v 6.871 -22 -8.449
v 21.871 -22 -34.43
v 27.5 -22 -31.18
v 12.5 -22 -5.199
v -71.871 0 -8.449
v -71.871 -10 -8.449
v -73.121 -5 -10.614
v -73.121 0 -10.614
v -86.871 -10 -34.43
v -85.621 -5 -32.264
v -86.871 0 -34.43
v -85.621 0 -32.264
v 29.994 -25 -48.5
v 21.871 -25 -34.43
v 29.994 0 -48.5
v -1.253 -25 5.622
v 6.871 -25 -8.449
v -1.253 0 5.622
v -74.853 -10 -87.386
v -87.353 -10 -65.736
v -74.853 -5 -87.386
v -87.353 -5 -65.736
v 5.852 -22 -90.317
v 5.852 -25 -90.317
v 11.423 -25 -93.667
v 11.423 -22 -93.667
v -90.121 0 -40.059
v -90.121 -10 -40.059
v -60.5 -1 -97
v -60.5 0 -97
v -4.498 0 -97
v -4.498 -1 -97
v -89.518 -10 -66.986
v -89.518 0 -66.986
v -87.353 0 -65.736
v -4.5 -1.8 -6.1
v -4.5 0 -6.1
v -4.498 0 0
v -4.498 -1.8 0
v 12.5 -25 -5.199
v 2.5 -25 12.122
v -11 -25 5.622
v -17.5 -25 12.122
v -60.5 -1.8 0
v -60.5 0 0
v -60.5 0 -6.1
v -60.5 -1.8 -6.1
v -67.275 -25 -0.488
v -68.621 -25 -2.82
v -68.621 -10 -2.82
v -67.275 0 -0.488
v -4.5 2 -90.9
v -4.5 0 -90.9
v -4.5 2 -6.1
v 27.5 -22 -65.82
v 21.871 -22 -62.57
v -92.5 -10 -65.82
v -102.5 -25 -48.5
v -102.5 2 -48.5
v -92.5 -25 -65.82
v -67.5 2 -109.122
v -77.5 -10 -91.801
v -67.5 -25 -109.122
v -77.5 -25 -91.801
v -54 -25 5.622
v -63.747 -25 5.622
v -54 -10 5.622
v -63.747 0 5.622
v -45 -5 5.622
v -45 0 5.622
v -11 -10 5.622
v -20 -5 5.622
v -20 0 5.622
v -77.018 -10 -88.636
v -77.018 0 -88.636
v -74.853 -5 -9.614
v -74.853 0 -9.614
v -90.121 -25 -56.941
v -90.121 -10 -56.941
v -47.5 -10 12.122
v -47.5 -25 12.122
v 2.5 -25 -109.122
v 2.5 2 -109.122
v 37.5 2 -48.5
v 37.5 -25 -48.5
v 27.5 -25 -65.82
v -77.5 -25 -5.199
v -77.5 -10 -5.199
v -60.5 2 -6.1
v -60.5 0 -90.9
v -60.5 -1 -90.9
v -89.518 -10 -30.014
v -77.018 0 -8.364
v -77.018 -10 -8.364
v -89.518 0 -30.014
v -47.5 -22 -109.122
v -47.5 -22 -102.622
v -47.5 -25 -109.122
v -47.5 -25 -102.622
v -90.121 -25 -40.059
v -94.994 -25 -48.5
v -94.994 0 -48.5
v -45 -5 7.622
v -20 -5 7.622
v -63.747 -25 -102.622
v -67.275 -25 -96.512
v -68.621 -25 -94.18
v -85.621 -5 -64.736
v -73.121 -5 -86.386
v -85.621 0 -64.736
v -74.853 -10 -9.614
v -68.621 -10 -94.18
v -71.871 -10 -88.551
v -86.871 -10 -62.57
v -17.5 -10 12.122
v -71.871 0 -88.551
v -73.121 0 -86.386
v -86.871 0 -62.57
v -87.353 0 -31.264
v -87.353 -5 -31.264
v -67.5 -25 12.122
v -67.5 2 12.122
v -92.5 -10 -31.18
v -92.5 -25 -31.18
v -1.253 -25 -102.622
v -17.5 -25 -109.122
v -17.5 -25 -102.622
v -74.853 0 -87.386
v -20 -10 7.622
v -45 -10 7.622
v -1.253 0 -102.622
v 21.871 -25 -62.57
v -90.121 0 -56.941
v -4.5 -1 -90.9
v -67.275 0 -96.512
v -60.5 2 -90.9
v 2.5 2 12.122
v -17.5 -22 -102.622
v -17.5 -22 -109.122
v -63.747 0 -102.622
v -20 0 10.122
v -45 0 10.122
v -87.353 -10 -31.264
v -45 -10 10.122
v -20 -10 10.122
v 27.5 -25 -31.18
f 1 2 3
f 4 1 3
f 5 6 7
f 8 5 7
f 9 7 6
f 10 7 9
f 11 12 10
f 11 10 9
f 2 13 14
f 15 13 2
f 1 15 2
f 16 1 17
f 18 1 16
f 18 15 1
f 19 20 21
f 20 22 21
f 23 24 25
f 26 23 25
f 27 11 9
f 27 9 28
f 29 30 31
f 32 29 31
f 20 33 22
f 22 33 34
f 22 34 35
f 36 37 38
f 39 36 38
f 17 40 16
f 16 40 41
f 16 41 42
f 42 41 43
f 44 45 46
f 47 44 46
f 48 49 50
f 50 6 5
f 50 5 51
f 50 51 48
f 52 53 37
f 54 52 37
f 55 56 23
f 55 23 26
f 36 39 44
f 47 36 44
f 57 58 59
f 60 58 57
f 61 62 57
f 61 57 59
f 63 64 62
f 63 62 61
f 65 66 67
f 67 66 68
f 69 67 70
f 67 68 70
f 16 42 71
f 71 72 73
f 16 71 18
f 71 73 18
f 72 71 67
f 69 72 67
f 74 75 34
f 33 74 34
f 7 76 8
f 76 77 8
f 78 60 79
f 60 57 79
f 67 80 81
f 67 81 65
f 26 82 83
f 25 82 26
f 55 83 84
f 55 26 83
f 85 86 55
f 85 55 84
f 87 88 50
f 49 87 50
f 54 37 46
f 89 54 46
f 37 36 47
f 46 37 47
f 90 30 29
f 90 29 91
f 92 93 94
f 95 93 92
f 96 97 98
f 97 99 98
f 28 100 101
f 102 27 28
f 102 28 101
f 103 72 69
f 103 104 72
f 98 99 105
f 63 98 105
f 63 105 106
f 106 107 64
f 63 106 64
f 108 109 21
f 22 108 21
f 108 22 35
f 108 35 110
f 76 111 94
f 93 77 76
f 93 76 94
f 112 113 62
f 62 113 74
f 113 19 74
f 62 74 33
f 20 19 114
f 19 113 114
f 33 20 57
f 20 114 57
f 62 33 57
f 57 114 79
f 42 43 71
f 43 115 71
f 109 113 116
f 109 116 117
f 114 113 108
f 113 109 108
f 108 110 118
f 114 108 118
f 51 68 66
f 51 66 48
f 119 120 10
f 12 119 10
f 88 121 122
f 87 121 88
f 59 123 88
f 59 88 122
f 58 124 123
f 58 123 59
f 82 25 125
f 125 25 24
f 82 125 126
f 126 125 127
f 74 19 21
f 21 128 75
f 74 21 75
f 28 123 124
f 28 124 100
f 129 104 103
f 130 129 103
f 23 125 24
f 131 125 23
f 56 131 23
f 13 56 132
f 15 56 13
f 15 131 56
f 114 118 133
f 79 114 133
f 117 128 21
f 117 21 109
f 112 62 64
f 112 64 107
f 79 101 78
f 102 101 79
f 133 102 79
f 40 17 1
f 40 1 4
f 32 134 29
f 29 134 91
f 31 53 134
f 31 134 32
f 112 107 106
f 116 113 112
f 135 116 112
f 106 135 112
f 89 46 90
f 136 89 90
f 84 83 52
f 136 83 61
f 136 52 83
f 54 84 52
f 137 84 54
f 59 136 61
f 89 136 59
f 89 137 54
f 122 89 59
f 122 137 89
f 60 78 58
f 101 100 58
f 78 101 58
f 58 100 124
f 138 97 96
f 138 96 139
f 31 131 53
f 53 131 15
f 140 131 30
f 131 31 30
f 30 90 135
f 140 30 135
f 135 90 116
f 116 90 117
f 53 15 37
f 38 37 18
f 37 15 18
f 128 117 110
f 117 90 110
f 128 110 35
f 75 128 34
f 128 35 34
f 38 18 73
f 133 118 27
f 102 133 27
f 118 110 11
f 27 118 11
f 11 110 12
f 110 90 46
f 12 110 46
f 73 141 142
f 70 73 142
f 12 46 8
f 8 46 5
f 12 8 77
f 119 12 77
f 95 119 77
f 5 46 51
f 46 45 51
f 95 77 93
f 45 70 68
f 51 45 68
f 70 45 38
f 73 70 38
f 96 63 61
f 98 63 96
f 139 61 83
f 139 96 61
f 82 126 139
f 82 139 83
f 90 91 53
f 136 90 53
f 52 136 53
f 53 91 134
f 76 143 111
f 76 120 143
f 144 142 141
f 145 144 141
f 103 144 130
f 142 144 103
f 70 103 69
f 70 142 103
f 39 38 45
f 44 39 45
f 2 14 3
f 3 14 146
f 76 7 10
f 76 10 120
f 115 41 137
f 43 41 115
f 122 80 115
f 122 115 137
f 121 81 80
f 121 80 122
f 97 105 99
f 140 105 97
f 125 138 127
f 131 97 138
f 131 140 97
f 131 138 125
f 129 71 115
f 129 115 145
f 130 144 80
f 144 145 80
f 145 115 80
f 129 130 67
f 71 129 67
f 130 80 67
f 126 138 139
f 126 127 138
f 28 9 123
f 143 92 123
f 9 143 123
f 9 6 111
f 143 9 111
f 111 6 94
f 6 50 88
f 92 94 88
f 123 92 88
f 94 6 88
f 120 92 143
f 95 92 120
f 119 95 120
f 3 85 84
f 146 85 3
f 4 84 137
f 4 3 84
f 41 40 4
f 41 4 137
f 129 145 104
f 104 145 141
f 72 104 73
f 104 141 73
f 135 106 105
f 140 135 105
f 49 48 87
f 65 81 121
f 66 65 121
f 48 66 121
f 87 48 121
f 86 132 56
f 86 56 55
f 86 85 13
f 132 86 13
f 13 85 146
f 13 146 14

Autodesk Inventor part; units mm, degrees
ref_plane "YZ Plane" through (0, 0, 0) normal (1, 0, 0) x (0, 1, 0)
ref_plane "XZ Plane" through (0, 0, 0) normal (0, 1, 0) x (-1, 0, 0)
ref_plane "XY Plane" through (0, 0, 0) normal (0, 0, 1) x (1, 0, 0)
sketch "Sketch6" plane through (0, 0, 0) normal (0, 1, 0) x (-1, 0, 0)
  line L0 (4.5, -6.1) -> (60.5, -6.1)
  line L1 (60.5, -6.1) -> (60.5, -90.9)
  line L2 (4.5, -90.9) -> (4.5, -6.1)
  line L3 (65.1201, -97) -> (0, -97)
  line L4 (0, -97) -> (0, 0)
  line L5 (0, 0) -> (65.1201, 0)
  line L6 (65.1201, 0) -> (65.1201, -97)
  line L7 (60.5, -90.9) -> (4.5, -90.9)
  line L8 (102.5, -48.5) -> (-37.5, -48.5)
  line L9 (32.5, -118.5) -> (32.5, 21.5)
  circle A0 centre (32.5, -48.5) radius 70
  line L10 (102.5, -48.5) -> (67.5, -109.1218)
  line L11 (67.5, -109.1218) -> (-2.5, -109.1218)
  line L12 (-2.5, -109.1218) -> (-37.5, -48.5)
  line L13 (-37.5, -48.5) -> (-2.5, 12.1218)
  line L14 (-2.5, 12.1218) -> (67.5, 12.1218)
  line L15 (67.5, 12.1218) -> (102.5, -48.5)
  line L16 (32.5, 12.1218) -> (85, -18.1891)
  line L17 (85, -18.1891) -> (85, -78.8109)
  line L18 (85, -78.8109) -> (32.5, -109.1218)
  line L19 (32.5, -109.1218) -> (-20, -78.8109)
  line L20 (-20, -78.8109) -> (-20, -18.1891)
  line L21 (-20, -18.1891) -> (32.5, 12.1218)
  line L22 (32.5, 12.1218) -> (47.5, 12.1218)
  line L23 (47.5, 12.1218) -> (47.5, 5.6218)
  line L24 (47.5, 5.6218) -> (17.5, 5.6218)
  line L25 (17.5, 5.6218) -> (17.5, 12.1218)
  line L26 (47.5, 5.6218) -> (56.6924, 5.6218) construction
  line L27 (17.5, 8.8718) -> (20, 8.8718)
  line L28 (47.5, 8.8718) -> (45, 8.8718)
  line L29 (45, 8.8718) -> (45, 10.1218)
  line L30 (45, 10.1218) -> (20, 10.1218)
  line L31 (20, 10.1218) -> (20, 7.6218)
  line L32 (20, 7.6218) -> (45, 7.6218)
  line L33 (45, 7.6218) -> (45, 10.1218)
  line L34 (67.5, 12.1218) -> (32.5, -48.5)
  line L35 (32.5, -48.5) -> (67.5, -109.1218)
  line L36 (47.5, 5.6218) -> (56.6924, 5.6218)
  line L37 (17.5, 5.6218) -> (11, 5.6218)
  line L38 (17.5, 12.1218) -> (11, 5.6218)
  line L39 (17.5, 12.1218) -> (26.6924, 12.1218) construction
  line L40 (47.5, 12.1218) -> (54, 5.6218)
  line L41 (85, -18.1891) -> (77.5, -5.1987)
  line L42 (77.5, -5.1987) -> (71.8708, -8.4487)
  line L43 (71.8708, -8.4487) -> (86.8708, -34.4295)
  line L44 (86.8708, -34.4295) -> (92.5, -31.1795)
  line L45 (71.8708, -8.4487) -> (67.2746, -0.4879) construction
  line L46 (89.6854, -32.8045) -> (88.4354, -30.6394)
  line L47 (74.6854, -6.8237) -> (75.9354, -8.9888)
  line L48 (75.9354, -8.9888) -> (77.0179, -8.3638)
  line L49 (77.0179, -8.3638) -> (89.5179, -30.0144)
  line L50 (89.5179, -30.0144) -> (87.3529, -31.2644)
  line L51 (87.3529, -31.2644) -> (74.8529, -9.6138)
  line L52 (74.8529, -9.6138) -> (77.0179, -8.3638)
  line L53 (71.8708, -8.4487) -> (67.2746, -0.4879)
  line L54 (86.8708, -34.4295) -> (90.1208, -40.0587)
  line L55 (92.5, -31.1795) -> (90.1208, -40.0587)
  line L56 (92.5, -31.1795) -> (87.9038, -23.2187) construction
  line L57 (77.5, -5.1987) -> (68.6208, -2.8196)
  line L58 (71.8708, -88.5513) -> (67.2746, -96.5121) construction
  line L59 (74.6854, -90.1763) -> (75.9354, -88.0112)
  line L60 (74.8529, -87.3862) -> (77.0179, -88.6362)
  line L61 (77.5, -91.8013) -> (71.8708, -88.5513)
  line L62 (77.5, -91.8013) -> (68.6208, -94.1804)
  line L63 (71.8708, -88.5513) -> (67.2746, -96.5121)
  line L64 (77.0179, -88.6362) -> (89.5179, -66.9856)
  line L65 (87.3529, -65.7356) -> (74.8529, -87.3862)
  line L66 (71.8708, -88.5513) -> (86.8708, -62.5705)
  line L67 (89.5179, -66.9856) -> (87.3529, -65.7356)
  line L68 (89.6854, -64.1955) -> (88.4354, -66.3606)
  line L69 (86.8708, -62.5705) -> (92.5, -65.8205)
  line L70 (86.8708, -62.5705) -> (90.1208, -56.9413)
  line L71 (92.5, -65.8205) -> (90.1208, -56.9413)
  line L72 (94.9944, -48.5) -> (63.7472, -102.6218)
  line L73 (63.7472, -102.6218) -> (1.2528, -102.6218)
  line L74 (1.2528, -102.6218) -> (-29.9944, -48.5)
  line L75 (-29.9944, -48.5) -> (1.2528, 5.6218)
  line L76 (1.2528, 5.6218) -> (63.7472, 5.6218)
  line L77 (63.7472, 5.6218) -> (94.9944, -48.5)
  line L78 (74.8529, -87.3862) -> (73.1208, -86.3862)
  line L79 (87.3529, -65.7356) -> (85.6208, -64.7356)
  line L80 (87.3529, -31.2644) -> (85.6208, -32.2644)
  line L81 (74.8529, -9.6138) -> (73.1208, -10.6138)
  line L82 (45, 7.6218) -> (45, 5.6218)
  line L83 (20, 7.6218) -> (20, 5.6218)
  line L84 (60.5, -90.9) -> (4.4985, -90.9)
  line L85 (4.4985, -90.9) -> (4.4985, -97)
  line L86 (4.4985, -97) -> (60.5, -97)
  line L87 (60.5, -97) -> (60.5, -90.9)
  line L88 (60.5, -6.1) -> (4.4985, -6.1)
  line L89 (4.4985, -6.1) -> (4.4985, 0)
  line L90 (4.4985, 0) -> (60.5, 0)
  line L91 (60.5, 0) -> (60.5, -6.1)
  dimension "d44" = 97
  dimension "d77" = 140
  dimension "d87" = 15
  dimension "d88" = 6.5
  dimension "d89" = 30
  dimension "d91" = 2.5
  dimension "d92" = 2.5
  dimension "d95" = 1.25
  dimension "d96" = 25
  dimension "d97" = 2.5
  dimension "d98" = 25
  dimension "d99" = 135
  dimension "d100" = 0
extrude "Fronte" add sketch "Sketch6" along normal blind 2 contours L89 L21 L5 L9 L0 | L2 L8 L4 L21 L89 | L9 L5 L16 L34 L0 | L2 L85 L19 L4 L8 | L89 L5 L21 | L21 L4 L5 L89 | L34 L16 L91 L0 | L9 L24 L16 L5 | L5 L21 L24 L9 | L7 L9 L3 L19 L85 | L8 L20 L75 L21 L4 | L4 L19 L74 L20 L8 | L21 L75 L76 L37 L24 L5 L4 | L91 L16 L6 L8 L1 | L34 L91 L16 | L16 L5 L34 | L8 L6 L18 L87 L1 | L7 L35 L18 L3 L9 | L7 L87 L18 L35 | L16 L24 L36 L76 L34 L5 | L24 L21 L32 L9 | L9 L32 L16 L24 | L85 L3 L4 L19 | L19 L3 L85 | L4 L3 L19 L73 L74 | L20 L74 L8 | L8 L75 L20 | L75 L20 L21 | L21 L13 L14 L38 L76 L75 | L24 L83 L32 L21 | L91 L5 L6 L16 | L34 L77 L53 L43 L16 L6 L5 | L8 L17 L66 L18 L6 | L6 L16 L43 L17 L8 | L9 L73 L19 L3 | L3 L18 L73 L9 | L35 L3 L18 | L18 L87 L35 | L16 L32 L82 L24 | L32 L21 L30 L9 | L9 L30 L16 L32 | L74 L73 L19 L11 L12 | L19 L20 L74 | L74 L20 L12 L8 | L8 L13 L20 L75 | L32 L31 L30 L21 | L24 L25 L27 L31 L83 | L76 L36 L40 L14 L34 | L34 L15 L57 L53 L77 | L18 L6 L3 L87 | L18 L66 L63 L72 L35 L3 L6 | L17 L43 L54 L77 L8 | L8 L72 L70 L66 L17 | L3 L35 L73 L18 | L73 L18 L9 | L9 L19 L73 | L16 L30 L29 L33 L32 | L82 L33 L28 L23 L24 | L30 L21 L9 | L9 L16 L30 | L38 L25 L37 | L30 L31 L27 L25 L14 L21 | L43 L81 L51 L16 | L16 L51 L17 L43 | L66 L17 L65 L18 | L18 L65 L78 L66 | L77 L55 L15 L8 | L8 L10 L71 L72 | L17 L51 L80 L43 | L66 L79 L65 L17 | L73 L35 L11 L18 | L72 L63 L62 L10 L35 | L16 L14 L23 L28 L29 L30 | L23 L40 L36 | L51 L52 L48 L49 L16 | L16 L49 L17 L51 | L43 L42 L47 L52 L81 | L15 L16 L49 L48 L47 L42 | L42 L53 L57 | L65 L17 L64 L18 | L18 L64 L60 L65 | L78 L60 L59 L61 L66 | L71 L69 L70 | L54 L44 L55 | L17 L49 L50 L51 | L80 L50 L46 L44 L43 | L65 L67 L64 L17 | L66 L69 L68 L67 L79 | L16 L17 L49 | L10 L17 L64 L67 L68 L69 | L44 L46 L50 L49 L17 L15 | L64 L17 L18 | L18 L10 L61 L59 L60 L64 | L61 L62 L63
extrude "Esterno" add sketch "Sketch6" against normal blind 25 contours L75 L20 L21 | L21 L13 L14 L38 L76 L75 | L74 L73 L19 L11 L12 | L19 L20 L74 | L74 L20 L12 L8 | L8 L13 L20 L75 | L76 L36 L40 L14 L34 | L34 L15 L57 L53 L77 | L73 L18 L9 | L9 L19 L73 | L77 L55 L15 L8 | L8 L10 L71 L72 | L73 L35 L11 L18 | L72 L63 L62 L10 L35
extrude "Strip" add sketch "Sketch6" against normal blind 10 contours L24 L21 L32 L9 | L9 L32 L16 L24 | L24 L83 L32 L21 | L16 L32 L82 L24 | L24 L25 L27 L31 L83 | L82 L33 L28 L23 L24 | L30 L21 L9 | L9 L16 L30 | L38 L25 L37 | L30 L31 L27 L25 L14 L21 | L43 L81 L51 L16 | L16 L51 L17 L43 | L66 L17 L65 L18 | L18 L65 L78 L66 | L17 L51 L80 L43 | L66 L79 L65 L17 | L16 L14 L23 L28 L29 L30 | L23 L40 L36 | L43 L42 L47 L52 L81 | L15 L16 L49 L48 L47 L42 | L42 L53 L57 | L78 L60 L59 L61 L66 | L71 L69 L70 | L54 L44 L55 | L80 L50 L46 L44 L43 | L66 L69 L68 L67 L79 | L16 L17 L49 | L10 L17 L64 L67 L68 L69 | L44 L46 L50 L49 L17 L15 | L64 L17 L18 | L18 L10 L61 L59 L60 L64 | L61 L62 L63
sketch "Sketch7" plane through (0, -25, 0) normal (0, -1, 0) x (1, 0, 0)
  line L0 (-17.5, 12.1218) -> (-17.5, -109.1218)
  line L1 (-67.5, -109.1218) -> (2.5, -109.1218) projected
  line L2 (-47.5, 12.1218) -> (-67.5, 12.1218) projected
  line L3 (-47.5, 12.1218) -> (-47.5, -109.1218)
  line L4 (-77.5, -91.8013) -> (-67.5, -109.1218) projected
  line L5 (-77.5, -91.8013) -> (27.5, -31.1795)
  line L6 (2.5, 12.1218) -> (37.5, -48.5) projected
  line L7 (-92.5, -65.8205) -> (-90.1208, -56.9413) projected
  line L8 (-92.5, -65.8205) -> (12.5, -5.1987)
  line L9 (-77.5, -5.1987) -> (27.5, -65.8205)
  line L10 (37.5, -48.5) -> (2.5, -109.1218) projected
  line L11 (-92.5, -31.1795) -> (11.423, -93.6666)
  line L12 (27.5, -31.1795) -> (12.5, -5.1987)
  line L13 (27.5, -65.8205) -> (11.423, -93.6666)
  line L14 (-1.2528, -102.6218) -> (29.9944, -48.5) projected
  line L15 (5.8516, -90.3166) -> (21.8708, -62.5705)
  line L16 (-47.5, -109.1218) -> (-17.5, -109.1218)
  line L17 (-17.5, -109.1218) -> (-17.5, -102.6218)
  line L18 (-17.5, -102.6218) -> (-47.5, -102.6218)
  line L19 (-47.5, -102.6218) -> (-47.5, -109.1218)
  line L20 (5.5339, -9.2206) -> (17.5, -36.953)
  point P0 (0, 0)
  point P1 (6.9325, -8.4131)
  point P2 (21.9325, -34.3939)
extrude "Passacavi" cut sketch "Sketch7" against normal blind 3 contours L0 L1 L3 L18 | L14 L9 L10 L11 | L20 L8 L6 L5
extrude "ScavoStrip" cut sketch "Sketch6" against normal blind 5 contours L24 L21 L32 L9 | L9 L32 L16 L24 | L24 L83 L32 L21 | L16 L32 L82 L24 | L43 L81 L51 L16 | L16 L51 L17 L43 | L66 L17 L65 L18 | L18 L65 L78 L66 | L17 L51 L80 L43 | L66 L79 L65 L17
extrude "ScreenDis1" add sketch "Sketch6" against normal blind 1 contours L7 L9 L3 L19 L85 | L7 L35 L18 L3 L9 | L7 L87 L18 L35 | L19 L3 L85 | L35 L3 L18 | L18 L87 L35
extrude "ScreenDist1.8" add sketch "Sketch6" against normal blind 1.8 contours L89 L21 L5 L9 L0 | L9 L5 L16 L34 L0 | L89 L5 L21 | L34 L16 L91 L0 | L34 L91 L16 | L16 L5 L34
properties part number "Hexagone" material "Wood (Cherry)"
